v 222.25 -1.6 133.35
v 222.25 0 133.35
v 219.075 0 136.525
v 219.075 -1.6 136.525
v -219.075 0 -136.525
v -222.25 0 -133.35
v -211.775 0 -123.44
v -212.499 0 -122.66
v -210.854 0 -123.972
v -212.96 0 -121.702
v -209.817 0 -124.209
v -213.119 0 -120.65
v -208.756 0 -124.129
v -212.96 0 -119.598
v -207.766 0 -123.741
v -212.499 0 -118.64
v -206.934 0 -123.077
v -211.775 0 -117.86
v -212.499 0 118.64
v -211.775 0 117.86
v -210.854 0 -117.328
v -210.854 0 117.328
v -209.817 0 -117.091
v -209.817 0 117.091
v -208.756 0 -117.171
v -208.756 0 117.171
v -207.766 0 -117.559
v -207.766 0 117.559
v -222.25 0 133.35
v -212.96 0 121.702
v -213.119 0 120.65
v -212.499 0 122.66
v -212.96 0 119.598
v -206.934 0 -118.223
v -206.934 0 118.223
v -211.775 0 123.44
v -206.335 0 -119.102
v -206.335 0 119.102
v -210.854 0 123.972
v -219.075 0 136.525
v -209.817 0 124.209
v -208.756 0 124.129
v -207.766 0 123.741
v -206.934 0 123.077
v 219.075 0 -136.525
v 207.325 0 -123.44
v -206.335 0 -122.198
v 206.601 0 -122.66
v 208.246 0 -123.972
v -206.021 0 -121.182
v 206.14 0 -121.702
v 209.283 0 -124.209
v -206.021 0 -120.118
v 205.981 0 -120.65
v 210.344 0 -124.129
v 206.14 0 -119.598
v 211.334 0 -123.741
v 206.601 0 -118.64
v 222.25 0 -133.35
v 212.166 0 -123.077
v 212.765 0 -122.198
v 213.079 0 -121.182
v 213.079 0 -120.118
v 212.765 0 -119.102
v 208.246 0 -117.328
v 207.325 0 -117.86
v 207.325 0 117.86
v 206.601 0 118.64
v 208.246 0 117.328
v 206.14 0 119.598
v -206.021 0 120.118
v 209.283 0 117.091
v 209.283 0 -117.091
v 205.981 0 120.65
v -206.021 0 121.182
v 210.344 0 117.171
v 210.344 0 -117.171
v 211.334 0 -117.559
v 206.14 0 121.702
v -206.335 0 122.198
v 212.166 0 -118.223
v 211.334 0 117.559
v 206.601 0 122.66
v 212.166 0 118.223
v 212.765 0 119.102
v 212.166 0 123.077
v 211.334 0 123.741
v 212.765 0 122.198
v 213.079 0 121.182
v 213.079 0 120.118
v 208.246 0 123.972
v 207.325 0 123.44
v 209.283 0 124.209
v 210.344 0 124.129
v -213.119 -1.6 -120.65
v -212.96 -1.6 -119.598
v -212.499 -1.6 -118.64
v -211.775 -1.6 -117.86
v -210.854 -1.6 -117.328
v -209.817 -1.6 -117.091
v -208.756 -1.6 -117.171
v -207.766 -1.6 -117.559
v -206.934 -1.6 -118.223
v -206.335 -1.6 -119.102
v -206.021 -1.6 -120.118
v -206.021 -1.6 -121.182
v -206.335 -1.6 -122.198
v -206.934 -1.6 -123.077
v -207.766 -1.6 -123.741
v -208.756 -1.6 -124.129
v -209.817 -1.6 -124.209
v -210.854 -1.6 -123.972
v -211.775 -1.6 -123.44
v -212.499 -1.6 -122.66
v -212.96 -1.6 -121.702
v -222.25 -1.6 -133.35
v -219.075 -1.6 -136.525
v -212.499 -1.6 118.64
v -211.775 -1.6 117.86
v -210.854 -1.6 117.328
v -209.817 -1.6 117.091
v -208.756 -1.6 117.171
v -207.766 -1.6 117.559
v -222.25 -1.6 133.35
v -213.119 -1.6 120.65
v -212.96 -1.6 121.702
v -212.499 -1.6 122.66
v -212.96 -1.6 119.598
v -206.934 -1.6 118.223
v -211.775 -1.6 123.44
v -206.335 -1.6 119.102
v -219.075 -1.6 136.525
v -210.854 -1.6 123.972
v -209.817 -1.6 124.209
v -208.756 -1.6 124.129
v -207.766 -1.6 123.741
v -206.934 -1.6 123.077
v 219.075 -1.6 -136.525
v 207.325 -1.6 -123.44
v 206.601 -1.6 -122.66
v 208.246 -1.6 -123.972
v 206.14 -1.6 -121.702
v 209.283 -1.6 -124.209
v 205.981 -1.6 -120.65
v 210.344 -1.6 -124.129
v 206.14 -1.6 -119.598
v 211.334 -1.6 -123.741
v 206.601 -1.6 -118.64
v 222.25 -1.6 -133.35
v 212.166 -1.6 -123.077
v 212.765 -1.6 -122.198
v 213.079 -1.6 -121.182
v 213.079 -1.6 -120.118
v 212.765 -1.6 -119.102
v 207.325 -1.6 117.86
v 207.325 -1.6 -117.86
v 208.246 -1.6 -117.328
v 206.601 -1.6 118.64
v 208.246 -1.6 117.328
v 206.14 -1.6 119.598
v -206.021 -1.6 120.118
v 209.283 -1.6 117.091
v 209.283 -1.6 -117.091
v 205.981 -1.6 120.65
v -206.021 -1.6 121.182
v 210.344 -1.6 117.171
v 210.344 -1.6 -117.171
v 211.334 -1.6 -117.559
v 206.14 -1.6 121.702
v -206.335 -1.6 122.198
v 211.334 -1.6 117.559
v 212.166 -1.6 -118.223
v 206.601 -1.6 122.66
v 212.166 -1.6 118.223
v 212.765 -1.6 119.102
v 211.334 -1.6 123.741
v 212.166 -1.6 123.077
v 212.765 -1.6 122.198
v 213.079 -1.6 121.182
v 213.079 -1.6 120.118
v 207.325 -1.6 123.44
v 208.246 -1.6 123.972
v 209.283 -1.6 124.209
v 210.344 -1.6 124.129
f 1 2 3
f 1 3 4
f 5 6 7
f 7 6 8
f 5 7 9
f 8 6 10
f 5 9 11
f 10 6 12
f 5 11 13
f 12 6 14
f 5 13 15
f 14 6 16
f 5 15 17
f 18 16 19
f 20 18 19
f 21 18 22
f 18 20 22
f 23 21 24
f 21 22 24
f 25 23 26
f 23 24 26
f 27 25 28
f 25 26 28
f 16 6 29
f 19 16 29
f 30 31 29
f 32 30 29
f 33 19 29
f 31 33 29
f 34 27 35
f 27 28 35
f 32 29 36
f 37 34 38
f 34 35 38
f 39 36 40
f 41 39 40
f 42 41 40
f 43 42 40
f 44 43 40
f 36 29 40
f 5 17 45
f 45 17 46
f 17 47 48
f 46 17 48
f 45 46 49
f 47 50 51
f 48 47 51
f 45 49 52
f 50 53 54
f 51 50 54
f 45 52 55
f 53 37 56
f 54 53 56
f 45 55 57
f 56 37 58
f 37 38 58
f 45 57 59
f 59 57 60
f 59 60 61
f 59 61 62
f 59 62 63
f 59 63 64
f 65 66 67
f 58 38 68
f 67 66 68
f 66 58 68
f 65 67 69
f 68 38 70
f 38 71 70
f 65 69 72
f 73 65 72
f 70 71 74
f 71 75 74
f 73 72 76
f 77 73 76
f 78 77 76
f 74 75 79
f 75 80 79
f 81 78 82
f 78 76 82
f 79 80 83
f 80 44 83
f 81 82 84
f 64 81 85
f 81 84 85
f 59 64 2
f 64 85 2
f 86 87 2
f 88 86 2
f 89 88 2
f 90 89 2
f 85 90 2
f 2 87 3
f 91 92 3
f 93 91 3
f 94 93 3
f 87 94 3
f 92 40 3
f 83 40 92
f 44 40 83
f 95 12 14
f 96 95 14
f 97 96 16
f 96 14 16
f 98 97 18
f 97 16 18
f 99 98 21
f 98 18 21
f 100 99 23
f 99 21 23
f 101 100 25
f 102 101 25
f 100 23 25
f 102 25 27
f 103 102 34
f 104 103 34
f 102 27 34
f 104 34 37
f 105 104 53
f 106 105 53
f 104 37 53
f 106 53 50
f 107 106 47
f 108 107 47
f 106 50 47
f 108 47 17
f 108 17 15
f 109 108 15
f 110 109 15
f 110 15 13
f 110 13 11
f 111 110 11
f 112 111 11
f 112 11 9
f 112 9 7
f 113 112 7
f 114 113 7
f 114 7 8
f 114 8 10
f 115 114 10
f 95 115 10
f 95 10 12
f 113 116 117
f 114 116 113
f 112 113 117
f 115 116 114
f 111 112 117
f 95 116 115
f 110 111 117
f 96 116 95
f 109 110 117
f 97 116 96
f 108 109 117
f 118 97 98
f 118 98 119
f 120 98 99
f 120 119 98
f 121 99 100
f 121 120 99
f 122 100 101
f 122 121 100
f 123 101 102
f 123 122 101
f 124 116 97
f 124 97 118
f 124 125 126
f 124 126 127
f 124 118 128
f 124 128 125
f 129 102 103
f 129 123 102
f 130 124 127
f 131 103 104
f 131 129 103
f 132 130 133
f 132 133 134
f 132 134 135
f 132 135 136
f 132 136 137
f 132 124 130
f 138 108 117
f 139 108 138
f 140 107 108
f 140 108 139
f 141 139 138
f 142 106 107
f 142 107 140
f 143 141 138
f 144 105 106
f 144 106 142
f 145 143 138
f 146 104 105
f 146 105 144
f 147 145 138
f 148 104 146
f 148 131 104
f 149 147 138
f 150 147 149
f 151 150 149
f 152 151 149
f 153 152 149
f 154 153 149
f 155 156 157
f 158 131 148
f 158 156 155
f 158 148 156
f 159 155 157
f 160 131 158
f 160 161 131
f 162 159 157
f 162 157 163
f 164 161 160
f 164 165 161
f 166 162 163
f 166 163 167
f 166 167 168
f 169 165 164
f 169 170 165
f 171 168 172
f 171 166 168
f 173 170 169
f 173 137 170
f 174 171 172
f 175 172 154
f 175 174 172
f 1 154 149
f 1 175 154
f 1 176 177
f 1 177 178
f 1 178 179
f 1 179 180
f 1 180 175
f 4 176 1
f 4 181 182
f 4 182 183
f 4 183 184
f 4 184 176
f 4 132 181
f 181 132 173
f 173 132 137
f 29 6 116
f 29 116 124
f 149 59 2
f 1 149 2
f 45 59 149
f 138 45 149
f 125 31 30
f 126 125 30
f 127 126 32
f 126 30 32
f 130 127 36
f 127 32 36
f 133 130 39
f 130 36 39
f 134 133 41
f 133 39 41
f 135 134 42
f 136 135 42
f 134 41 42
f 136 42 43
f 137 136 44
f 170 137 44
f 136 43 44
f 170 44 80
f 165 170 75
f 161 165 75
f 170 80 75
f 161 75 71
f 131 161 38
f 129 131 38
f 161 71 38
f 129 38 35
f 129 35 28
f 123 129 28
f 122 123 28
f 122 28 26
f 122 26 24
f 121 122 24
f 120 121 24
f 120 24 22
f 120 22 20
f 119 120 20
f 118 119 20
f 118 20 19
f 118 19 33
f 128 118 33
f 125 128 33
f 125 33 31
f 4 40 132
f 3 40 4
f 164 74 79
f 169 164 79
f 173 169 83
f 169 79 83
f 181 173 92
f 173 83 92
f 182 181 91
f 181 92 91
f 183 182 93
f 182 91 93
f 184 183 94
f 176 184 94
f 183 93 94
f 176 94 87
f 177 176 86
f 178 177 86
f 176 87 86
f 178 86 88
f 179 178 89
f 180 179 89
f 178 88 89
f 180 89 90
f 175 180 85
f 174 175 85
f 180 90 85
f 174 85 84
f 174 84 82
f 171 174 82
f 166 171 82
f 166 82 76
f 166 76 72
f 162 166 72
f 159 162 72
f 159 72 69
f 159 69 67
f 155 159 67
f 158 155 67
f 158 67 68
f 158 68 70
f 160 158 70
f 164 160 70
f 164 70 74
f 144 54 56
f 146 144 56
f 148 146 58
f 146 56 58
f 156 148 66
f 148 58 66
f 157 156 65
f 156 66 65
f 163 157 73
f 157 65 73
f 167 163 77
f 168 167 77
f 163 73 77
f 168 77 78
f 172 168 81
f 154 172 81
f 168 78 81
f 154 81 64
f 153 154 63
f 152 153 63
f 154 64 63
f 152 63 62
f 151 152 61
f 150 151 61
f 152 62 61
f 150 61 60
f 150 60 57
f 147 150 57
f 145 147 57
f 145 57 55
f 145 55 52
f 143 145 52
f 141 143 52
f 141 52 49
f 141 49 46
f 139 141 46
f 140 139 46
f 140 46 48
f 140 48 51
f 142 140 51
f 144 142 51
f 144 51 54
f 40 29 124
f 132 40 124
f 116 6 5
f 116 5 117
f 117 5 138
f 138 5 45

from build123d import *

# Parameters (mm, degrees)
F0_W     = 444.5
F0_H     = 273.05
F1_DEPTH = 1.6002
F2_SIZE  = 3.175
F4_D     = 7.1374


with BuildPart() as f1:
    # F0 (on Front) → F1 (new body)
    with BuildSketch(Plane.XZ):
        Rectangle(F0_W, F0_H)
    extrude(amount=F1_DEPTH)

    # F2
    f2_edges = [f1.edges().sort_by_distance(p)[0] for p in [
        (-222.25, -0.8001, 136.525),
        (-222.25, -0.8001, -136.525),
        (222.25, -0.8001, -136.525),
        (222.25, -0.8001, 136.525),
    ]]
    chamfer(f2_edges, length=F2_SIZE)

    # F4 (through all)
    with Locations(Plane.XZ.offset(1.6002)):
        with Locations((-209.55, 120.65), (209.55, 120.65), (209.55, -120.65), (-209.55, -120.65)):
            Hole(F4_D / 2)


solid = f1.part
